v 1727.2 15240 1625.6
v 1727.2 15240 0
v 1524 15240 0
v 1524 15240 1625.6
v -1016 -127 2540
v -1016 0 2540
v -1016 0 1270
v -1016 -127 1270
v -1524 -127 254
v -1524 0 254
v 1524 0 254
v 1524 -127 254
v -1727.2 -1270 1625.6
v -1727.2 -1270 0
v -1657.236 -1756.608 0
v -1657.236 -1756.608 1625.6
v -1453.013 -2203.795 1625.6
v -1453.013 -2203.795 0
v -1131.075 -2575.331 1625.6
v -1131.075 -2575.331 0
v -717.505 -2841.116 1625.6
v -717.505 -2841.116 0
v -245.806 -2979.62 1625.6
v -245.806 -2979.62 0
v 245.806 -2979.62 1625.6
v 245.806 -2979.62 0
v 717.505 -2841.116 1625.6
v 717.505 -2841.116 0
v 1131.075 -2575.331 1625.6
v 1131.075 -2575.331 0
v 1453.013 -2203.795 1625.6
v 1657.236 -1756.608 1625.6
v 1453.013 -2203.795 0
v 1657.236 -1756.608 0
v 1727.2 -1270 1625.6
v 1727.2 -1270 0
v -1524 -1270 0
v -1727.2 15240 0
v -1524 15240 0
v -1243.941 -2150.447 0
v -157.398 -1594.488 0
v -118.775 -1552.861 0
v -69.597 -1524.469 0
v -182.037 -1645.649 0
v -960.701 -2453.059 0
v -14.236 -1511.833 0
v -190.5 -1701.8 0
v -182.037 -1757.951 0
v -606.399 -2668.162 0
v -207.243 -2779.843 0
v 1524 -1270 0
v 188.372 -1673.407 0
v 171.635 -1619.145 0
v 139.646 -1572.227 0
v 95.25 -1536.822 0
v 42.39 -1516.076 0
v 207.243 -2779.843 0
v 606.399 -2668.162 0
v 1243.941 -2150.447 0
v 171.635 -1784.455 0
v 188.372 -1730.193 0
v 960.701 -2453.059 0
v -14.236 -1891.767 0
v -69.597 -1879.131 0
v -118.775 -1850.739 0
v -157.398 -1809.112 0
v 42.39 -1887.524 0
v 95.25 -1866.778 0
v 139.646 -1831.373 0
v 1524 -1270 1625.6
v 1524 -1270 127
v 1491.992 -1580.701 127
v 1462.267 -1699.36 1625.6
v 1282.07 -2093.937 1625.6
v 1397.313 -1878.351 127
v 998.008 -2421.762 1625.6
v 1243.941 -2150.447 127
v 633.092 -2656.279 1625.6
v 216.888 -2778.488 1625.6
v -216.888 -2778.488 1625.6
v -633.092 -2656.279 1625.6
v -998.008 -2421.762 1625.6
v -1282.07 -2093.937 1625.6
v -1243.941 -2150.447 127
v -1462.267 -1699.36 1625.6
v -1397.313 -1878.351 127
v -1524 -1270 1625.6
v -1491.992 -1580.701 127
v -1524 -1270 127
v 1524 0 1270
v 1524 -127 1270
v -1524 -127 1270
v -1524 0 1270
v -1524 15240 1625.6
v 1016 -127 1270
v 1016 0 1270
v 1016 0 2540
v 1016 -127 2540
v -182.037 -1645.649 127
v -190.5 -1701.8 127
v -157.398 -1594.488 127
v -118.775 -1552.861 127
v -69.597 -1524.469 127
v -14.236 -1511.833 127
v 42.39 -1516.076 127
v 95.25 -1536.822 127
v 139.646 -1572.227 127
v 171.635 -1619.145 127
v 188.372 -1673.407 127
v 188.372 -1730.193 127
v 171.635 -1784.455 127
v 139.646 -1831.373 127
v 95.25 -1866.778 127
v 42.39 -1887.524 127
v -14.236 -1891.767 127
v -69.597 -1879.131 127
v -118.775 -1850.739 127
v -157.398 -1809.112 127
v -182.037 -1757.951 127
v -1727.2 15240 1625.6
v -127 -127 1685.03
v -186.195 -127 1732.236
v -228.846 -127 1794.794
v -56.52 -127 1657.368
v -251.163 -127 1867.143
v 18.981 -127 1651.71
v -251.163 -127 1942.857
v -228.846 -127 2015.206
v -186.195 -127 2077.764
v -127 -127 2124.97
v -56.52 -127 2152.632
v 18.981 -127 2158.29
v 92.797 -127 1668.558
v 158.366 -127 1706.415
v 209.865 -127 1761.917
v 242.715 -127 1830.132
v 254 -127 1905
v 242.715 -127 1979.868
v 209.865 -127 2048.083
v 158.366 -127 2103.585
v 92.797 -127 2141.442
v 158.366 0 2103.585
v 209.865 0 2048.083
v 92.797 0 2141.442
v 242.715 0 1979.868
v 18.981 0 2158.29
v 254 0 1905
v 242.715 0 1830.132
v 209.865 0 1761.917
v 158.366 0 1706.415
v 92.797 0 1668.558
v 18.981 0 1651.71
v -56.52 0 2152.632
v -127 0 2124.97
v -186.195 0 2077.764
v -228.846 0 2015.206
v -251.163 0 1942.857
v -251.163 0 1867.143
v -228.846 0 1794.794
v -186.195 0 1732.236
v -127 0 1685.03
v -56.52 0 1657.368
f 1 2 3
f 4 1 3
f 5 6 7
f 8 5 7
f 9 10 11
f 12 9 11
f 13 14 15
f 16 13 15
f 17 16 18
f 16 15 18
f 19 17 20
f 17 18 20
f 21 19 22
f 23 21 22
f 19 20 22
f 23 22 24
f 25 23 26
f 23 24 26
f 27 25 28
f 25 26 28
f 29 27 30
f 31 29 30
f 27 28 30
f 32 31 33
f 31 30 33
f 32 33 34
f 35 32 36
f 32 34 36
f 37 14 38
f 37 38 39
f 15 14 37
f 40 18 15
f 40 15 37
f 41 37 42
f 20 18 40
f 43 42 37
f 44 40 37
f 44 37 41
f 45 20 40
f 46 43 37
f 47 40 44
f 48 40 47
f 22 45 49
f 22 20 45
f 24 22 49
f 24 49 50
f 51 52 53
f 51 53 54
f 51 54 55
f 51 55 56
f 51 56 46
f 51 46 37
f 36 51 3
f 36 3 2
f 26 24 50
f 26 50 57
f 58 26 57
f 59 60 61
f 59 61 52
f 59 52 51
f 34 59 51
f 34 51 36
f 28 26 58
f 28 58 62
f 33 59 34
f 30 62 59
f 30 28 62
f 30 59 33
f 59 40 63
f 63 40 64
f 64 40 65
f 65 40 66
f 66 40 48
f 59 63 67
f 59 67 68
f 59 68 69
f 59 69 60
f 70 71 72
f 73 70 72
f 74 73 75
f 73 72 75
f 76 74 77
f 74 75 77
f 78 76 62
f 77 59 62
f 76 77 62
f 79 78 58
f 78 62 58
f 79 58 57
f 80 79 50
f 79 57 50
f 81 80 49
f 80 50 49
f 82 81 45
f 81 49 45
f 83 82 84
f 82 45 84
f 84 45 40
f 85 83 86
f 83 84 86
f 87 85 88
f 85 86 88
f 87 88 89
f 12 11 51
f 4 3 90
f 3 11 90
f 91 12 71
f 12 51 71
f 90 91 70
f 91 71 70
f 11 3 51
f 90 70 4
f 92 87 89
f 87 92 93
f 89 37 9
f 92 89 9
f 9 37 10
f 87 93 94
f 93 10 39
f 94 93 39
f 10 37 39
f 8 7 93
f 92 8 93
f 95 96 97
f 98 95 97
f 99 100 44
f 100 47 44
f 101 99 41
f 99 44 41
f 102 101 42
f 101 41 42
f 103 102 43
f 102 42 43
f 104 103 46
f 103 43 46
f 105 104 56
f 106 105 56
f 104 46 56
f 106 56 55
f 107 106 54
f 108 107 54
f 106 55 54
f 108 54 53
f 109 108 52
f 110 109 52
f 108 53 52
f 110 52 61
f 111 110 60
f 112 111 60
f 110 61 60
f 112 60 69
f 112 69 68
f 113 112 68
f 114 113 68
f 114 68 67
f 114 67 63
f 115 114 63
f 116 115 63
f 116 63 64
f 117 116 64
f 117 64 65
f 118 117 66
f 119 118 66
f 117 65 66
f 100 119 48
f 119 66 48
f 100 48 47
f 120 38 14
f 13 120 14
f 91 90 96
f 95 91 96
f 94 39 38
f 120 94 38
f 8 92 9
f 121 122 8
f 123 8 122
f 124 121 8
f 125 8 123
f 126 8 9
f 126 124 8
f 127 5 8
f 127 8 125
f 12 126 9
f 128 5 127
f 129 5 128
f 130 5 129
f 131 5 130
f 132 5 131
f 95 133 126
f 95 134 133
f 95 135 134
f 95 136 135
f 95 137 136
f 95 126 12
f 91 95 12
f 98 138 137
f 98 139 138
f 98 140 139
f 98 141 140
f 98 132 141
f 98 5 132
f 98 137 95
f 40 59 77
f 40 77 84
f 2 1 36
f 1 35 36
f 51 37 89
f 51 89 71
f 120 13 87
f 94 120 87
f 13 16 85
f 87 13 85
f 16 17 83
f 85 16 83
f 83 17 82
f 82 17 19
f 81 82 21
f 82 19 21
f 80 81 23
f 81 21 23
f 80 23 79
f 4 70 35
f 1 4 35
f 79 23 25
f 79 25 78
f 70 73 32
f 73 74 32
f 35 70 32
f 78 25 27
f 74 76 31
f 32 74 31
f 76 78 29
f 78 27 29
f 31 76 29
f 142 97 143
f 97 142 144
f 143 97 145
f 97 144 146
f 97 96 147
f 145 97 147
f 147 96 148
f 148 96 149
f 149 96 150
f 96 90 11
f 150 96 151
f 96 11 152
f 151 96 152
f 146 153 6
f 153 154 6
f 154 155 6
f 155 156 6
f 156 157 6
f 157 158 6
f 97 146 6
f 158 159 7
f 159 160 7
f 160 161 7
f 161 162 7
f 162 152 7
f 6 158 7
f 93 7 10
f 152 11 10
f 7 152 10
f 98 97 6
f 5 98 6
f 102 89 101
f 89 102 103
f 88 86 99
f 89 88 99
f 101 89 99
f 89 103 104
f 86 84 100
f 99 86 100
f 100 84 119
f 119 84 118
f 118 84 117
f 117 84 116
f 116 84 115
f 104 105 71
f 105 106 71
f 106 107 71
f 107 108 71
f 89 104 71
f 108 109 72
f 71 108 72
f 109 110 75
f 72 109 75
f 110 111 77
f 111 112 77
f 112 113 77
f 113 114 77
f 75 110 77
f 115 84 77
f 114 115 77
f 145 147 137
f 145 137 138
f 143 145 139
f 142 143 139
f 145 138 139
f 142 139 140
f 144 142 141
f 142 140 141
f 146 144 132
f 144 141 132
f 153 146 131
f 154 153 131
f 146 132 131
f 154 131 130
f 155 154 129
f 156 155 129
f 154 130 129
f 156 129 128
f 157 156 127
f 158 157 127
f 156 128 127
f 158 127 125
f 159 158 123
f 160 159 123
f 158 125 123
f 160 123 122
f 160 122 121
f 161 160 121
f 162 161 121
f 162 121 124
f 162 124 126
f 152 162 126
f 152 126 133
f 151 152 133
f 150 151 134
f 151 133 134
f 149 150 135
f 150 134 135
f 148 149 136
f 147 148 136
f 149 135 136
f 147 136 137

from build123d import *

# Parameters (mm, degrees)
F1_DEPTH  = 1625.6
F3_DEPTH  = 127
F5_D      = 508
F5_DEPTH  = 127
F5_TIP    = 152.618597233
F7_DEPTH  = 15240
F9_DEPTH  = 127
F11_D     = 381
F11_DEPTH = 127
F11_TIP   = 114.4639479248


# Not quite as in the source:
# - a feature names something its author has since deleted; it is built from what else it names


with BuildPart() as f1:
    # F0 (on Top) → F1 (new body)
    with BuildSketch(Plane.XY):
        with BuildLine():
            Line((-1524, 0), (-1727.2, 0))
            Line((-1727.2, 0), (-1727.2, -1270))
            ThreePointArc((-1727.2, -1270), (0, -2997.2), (1727.2, -1270))
            Line((1727.2, -1270), (1727.2, 0))
            Line((1727.2, 0), (1524, 0))
            Line((1524, 0), (1524, -1270))
            ThreePointArc((1524, -1270), (0, -2794), (-1524, -1270))
            Line((-1524, -1270), (-1524, 0))
        make_face()
    extrude(amount=F1_DEPTH)

    # F2 (on Front) → F3 (join)
    with BuildSketch(Plane.XZ):
        Polygon((-1016, 1270), (-1524, 1270), (-1524, 254), (1524, 254), (1524, 1270), (1016, 1270), (1016, 2540), (0, 2540), (-1016, 2540), align=None)
    extrude(amount=F3_DEPTH)

    # F5
    with Locations(Plane(origin=(0, 0, 0), x_dir=(-1, 0, 0), z_dir=(0, 1, 0))):
        with Locations((0, 1905)):
            Hole(F5_D / 2, depth=F5_DEPTH)
            with Locations((0, 0, -(F5_DEPTH + F5_TIP / 2))):  # 118° drill point
                Cone(0, F5_D / 2, F5_TIP, mode=Mode.SUBTRACT)

    # F6 (on face) → F7 (join)
    with BuildSketch(Plane(origin=(0, 0, 0), x_dir=(-1, 0, 0), z_dir=(0, 1, 0))):
        Polygon((-1524, 1270), (-1524, 1625.6), (-1727.2, 1625.6), (-1727.2, 0), (-1524, 0), (-1524, 254), align=None)
        Polygon((1524, 1270), (1524, 254), (1524, 0), (1727.2, 0), (1727.2, 1625.6), (1524, 1625.6), align=None)
    extrude(amount=F7_DEPTH)

    # F8 (on face) → F9 (join)
    with BuildSketch(Plane(origin=(0, 0, 0), x_dir=(1, 0, 0), z_dir=(0, 0, -1))):
        with BuildLine():
            ThreePointArc((-1243.9406885357, 2150.4473654939), (-1452.2984557811, 1731.9580017012), (-1524, 1270))
            Line((-1524, 1270), (1524, 1270))
            ThreePointArc((1524, 1270), (1452.2984557811, 1731.9580017012), (1243.9406885357, 2150.4473654939))
            Line((1243.9406885357, 2150.4473654939), (-1243.9406885357, 2150.4473654939))
        make_face()
    extrude(amount=-F9_DEPTH)

    # F11
    with Locations(Plane.XY.offset(127)):
        with Locations((0, -1701.8)):
            Hole(F11_D / 2, depth=F11_DEPTH)
            with Locations((0, 0, -(F11_DEPTH + F11_TIP / 2))):  # 118° drill point
                Cone(0, F11_D / 2, F11_TIP, mode=Mode.SUBTRACT)


solid = f1.part
